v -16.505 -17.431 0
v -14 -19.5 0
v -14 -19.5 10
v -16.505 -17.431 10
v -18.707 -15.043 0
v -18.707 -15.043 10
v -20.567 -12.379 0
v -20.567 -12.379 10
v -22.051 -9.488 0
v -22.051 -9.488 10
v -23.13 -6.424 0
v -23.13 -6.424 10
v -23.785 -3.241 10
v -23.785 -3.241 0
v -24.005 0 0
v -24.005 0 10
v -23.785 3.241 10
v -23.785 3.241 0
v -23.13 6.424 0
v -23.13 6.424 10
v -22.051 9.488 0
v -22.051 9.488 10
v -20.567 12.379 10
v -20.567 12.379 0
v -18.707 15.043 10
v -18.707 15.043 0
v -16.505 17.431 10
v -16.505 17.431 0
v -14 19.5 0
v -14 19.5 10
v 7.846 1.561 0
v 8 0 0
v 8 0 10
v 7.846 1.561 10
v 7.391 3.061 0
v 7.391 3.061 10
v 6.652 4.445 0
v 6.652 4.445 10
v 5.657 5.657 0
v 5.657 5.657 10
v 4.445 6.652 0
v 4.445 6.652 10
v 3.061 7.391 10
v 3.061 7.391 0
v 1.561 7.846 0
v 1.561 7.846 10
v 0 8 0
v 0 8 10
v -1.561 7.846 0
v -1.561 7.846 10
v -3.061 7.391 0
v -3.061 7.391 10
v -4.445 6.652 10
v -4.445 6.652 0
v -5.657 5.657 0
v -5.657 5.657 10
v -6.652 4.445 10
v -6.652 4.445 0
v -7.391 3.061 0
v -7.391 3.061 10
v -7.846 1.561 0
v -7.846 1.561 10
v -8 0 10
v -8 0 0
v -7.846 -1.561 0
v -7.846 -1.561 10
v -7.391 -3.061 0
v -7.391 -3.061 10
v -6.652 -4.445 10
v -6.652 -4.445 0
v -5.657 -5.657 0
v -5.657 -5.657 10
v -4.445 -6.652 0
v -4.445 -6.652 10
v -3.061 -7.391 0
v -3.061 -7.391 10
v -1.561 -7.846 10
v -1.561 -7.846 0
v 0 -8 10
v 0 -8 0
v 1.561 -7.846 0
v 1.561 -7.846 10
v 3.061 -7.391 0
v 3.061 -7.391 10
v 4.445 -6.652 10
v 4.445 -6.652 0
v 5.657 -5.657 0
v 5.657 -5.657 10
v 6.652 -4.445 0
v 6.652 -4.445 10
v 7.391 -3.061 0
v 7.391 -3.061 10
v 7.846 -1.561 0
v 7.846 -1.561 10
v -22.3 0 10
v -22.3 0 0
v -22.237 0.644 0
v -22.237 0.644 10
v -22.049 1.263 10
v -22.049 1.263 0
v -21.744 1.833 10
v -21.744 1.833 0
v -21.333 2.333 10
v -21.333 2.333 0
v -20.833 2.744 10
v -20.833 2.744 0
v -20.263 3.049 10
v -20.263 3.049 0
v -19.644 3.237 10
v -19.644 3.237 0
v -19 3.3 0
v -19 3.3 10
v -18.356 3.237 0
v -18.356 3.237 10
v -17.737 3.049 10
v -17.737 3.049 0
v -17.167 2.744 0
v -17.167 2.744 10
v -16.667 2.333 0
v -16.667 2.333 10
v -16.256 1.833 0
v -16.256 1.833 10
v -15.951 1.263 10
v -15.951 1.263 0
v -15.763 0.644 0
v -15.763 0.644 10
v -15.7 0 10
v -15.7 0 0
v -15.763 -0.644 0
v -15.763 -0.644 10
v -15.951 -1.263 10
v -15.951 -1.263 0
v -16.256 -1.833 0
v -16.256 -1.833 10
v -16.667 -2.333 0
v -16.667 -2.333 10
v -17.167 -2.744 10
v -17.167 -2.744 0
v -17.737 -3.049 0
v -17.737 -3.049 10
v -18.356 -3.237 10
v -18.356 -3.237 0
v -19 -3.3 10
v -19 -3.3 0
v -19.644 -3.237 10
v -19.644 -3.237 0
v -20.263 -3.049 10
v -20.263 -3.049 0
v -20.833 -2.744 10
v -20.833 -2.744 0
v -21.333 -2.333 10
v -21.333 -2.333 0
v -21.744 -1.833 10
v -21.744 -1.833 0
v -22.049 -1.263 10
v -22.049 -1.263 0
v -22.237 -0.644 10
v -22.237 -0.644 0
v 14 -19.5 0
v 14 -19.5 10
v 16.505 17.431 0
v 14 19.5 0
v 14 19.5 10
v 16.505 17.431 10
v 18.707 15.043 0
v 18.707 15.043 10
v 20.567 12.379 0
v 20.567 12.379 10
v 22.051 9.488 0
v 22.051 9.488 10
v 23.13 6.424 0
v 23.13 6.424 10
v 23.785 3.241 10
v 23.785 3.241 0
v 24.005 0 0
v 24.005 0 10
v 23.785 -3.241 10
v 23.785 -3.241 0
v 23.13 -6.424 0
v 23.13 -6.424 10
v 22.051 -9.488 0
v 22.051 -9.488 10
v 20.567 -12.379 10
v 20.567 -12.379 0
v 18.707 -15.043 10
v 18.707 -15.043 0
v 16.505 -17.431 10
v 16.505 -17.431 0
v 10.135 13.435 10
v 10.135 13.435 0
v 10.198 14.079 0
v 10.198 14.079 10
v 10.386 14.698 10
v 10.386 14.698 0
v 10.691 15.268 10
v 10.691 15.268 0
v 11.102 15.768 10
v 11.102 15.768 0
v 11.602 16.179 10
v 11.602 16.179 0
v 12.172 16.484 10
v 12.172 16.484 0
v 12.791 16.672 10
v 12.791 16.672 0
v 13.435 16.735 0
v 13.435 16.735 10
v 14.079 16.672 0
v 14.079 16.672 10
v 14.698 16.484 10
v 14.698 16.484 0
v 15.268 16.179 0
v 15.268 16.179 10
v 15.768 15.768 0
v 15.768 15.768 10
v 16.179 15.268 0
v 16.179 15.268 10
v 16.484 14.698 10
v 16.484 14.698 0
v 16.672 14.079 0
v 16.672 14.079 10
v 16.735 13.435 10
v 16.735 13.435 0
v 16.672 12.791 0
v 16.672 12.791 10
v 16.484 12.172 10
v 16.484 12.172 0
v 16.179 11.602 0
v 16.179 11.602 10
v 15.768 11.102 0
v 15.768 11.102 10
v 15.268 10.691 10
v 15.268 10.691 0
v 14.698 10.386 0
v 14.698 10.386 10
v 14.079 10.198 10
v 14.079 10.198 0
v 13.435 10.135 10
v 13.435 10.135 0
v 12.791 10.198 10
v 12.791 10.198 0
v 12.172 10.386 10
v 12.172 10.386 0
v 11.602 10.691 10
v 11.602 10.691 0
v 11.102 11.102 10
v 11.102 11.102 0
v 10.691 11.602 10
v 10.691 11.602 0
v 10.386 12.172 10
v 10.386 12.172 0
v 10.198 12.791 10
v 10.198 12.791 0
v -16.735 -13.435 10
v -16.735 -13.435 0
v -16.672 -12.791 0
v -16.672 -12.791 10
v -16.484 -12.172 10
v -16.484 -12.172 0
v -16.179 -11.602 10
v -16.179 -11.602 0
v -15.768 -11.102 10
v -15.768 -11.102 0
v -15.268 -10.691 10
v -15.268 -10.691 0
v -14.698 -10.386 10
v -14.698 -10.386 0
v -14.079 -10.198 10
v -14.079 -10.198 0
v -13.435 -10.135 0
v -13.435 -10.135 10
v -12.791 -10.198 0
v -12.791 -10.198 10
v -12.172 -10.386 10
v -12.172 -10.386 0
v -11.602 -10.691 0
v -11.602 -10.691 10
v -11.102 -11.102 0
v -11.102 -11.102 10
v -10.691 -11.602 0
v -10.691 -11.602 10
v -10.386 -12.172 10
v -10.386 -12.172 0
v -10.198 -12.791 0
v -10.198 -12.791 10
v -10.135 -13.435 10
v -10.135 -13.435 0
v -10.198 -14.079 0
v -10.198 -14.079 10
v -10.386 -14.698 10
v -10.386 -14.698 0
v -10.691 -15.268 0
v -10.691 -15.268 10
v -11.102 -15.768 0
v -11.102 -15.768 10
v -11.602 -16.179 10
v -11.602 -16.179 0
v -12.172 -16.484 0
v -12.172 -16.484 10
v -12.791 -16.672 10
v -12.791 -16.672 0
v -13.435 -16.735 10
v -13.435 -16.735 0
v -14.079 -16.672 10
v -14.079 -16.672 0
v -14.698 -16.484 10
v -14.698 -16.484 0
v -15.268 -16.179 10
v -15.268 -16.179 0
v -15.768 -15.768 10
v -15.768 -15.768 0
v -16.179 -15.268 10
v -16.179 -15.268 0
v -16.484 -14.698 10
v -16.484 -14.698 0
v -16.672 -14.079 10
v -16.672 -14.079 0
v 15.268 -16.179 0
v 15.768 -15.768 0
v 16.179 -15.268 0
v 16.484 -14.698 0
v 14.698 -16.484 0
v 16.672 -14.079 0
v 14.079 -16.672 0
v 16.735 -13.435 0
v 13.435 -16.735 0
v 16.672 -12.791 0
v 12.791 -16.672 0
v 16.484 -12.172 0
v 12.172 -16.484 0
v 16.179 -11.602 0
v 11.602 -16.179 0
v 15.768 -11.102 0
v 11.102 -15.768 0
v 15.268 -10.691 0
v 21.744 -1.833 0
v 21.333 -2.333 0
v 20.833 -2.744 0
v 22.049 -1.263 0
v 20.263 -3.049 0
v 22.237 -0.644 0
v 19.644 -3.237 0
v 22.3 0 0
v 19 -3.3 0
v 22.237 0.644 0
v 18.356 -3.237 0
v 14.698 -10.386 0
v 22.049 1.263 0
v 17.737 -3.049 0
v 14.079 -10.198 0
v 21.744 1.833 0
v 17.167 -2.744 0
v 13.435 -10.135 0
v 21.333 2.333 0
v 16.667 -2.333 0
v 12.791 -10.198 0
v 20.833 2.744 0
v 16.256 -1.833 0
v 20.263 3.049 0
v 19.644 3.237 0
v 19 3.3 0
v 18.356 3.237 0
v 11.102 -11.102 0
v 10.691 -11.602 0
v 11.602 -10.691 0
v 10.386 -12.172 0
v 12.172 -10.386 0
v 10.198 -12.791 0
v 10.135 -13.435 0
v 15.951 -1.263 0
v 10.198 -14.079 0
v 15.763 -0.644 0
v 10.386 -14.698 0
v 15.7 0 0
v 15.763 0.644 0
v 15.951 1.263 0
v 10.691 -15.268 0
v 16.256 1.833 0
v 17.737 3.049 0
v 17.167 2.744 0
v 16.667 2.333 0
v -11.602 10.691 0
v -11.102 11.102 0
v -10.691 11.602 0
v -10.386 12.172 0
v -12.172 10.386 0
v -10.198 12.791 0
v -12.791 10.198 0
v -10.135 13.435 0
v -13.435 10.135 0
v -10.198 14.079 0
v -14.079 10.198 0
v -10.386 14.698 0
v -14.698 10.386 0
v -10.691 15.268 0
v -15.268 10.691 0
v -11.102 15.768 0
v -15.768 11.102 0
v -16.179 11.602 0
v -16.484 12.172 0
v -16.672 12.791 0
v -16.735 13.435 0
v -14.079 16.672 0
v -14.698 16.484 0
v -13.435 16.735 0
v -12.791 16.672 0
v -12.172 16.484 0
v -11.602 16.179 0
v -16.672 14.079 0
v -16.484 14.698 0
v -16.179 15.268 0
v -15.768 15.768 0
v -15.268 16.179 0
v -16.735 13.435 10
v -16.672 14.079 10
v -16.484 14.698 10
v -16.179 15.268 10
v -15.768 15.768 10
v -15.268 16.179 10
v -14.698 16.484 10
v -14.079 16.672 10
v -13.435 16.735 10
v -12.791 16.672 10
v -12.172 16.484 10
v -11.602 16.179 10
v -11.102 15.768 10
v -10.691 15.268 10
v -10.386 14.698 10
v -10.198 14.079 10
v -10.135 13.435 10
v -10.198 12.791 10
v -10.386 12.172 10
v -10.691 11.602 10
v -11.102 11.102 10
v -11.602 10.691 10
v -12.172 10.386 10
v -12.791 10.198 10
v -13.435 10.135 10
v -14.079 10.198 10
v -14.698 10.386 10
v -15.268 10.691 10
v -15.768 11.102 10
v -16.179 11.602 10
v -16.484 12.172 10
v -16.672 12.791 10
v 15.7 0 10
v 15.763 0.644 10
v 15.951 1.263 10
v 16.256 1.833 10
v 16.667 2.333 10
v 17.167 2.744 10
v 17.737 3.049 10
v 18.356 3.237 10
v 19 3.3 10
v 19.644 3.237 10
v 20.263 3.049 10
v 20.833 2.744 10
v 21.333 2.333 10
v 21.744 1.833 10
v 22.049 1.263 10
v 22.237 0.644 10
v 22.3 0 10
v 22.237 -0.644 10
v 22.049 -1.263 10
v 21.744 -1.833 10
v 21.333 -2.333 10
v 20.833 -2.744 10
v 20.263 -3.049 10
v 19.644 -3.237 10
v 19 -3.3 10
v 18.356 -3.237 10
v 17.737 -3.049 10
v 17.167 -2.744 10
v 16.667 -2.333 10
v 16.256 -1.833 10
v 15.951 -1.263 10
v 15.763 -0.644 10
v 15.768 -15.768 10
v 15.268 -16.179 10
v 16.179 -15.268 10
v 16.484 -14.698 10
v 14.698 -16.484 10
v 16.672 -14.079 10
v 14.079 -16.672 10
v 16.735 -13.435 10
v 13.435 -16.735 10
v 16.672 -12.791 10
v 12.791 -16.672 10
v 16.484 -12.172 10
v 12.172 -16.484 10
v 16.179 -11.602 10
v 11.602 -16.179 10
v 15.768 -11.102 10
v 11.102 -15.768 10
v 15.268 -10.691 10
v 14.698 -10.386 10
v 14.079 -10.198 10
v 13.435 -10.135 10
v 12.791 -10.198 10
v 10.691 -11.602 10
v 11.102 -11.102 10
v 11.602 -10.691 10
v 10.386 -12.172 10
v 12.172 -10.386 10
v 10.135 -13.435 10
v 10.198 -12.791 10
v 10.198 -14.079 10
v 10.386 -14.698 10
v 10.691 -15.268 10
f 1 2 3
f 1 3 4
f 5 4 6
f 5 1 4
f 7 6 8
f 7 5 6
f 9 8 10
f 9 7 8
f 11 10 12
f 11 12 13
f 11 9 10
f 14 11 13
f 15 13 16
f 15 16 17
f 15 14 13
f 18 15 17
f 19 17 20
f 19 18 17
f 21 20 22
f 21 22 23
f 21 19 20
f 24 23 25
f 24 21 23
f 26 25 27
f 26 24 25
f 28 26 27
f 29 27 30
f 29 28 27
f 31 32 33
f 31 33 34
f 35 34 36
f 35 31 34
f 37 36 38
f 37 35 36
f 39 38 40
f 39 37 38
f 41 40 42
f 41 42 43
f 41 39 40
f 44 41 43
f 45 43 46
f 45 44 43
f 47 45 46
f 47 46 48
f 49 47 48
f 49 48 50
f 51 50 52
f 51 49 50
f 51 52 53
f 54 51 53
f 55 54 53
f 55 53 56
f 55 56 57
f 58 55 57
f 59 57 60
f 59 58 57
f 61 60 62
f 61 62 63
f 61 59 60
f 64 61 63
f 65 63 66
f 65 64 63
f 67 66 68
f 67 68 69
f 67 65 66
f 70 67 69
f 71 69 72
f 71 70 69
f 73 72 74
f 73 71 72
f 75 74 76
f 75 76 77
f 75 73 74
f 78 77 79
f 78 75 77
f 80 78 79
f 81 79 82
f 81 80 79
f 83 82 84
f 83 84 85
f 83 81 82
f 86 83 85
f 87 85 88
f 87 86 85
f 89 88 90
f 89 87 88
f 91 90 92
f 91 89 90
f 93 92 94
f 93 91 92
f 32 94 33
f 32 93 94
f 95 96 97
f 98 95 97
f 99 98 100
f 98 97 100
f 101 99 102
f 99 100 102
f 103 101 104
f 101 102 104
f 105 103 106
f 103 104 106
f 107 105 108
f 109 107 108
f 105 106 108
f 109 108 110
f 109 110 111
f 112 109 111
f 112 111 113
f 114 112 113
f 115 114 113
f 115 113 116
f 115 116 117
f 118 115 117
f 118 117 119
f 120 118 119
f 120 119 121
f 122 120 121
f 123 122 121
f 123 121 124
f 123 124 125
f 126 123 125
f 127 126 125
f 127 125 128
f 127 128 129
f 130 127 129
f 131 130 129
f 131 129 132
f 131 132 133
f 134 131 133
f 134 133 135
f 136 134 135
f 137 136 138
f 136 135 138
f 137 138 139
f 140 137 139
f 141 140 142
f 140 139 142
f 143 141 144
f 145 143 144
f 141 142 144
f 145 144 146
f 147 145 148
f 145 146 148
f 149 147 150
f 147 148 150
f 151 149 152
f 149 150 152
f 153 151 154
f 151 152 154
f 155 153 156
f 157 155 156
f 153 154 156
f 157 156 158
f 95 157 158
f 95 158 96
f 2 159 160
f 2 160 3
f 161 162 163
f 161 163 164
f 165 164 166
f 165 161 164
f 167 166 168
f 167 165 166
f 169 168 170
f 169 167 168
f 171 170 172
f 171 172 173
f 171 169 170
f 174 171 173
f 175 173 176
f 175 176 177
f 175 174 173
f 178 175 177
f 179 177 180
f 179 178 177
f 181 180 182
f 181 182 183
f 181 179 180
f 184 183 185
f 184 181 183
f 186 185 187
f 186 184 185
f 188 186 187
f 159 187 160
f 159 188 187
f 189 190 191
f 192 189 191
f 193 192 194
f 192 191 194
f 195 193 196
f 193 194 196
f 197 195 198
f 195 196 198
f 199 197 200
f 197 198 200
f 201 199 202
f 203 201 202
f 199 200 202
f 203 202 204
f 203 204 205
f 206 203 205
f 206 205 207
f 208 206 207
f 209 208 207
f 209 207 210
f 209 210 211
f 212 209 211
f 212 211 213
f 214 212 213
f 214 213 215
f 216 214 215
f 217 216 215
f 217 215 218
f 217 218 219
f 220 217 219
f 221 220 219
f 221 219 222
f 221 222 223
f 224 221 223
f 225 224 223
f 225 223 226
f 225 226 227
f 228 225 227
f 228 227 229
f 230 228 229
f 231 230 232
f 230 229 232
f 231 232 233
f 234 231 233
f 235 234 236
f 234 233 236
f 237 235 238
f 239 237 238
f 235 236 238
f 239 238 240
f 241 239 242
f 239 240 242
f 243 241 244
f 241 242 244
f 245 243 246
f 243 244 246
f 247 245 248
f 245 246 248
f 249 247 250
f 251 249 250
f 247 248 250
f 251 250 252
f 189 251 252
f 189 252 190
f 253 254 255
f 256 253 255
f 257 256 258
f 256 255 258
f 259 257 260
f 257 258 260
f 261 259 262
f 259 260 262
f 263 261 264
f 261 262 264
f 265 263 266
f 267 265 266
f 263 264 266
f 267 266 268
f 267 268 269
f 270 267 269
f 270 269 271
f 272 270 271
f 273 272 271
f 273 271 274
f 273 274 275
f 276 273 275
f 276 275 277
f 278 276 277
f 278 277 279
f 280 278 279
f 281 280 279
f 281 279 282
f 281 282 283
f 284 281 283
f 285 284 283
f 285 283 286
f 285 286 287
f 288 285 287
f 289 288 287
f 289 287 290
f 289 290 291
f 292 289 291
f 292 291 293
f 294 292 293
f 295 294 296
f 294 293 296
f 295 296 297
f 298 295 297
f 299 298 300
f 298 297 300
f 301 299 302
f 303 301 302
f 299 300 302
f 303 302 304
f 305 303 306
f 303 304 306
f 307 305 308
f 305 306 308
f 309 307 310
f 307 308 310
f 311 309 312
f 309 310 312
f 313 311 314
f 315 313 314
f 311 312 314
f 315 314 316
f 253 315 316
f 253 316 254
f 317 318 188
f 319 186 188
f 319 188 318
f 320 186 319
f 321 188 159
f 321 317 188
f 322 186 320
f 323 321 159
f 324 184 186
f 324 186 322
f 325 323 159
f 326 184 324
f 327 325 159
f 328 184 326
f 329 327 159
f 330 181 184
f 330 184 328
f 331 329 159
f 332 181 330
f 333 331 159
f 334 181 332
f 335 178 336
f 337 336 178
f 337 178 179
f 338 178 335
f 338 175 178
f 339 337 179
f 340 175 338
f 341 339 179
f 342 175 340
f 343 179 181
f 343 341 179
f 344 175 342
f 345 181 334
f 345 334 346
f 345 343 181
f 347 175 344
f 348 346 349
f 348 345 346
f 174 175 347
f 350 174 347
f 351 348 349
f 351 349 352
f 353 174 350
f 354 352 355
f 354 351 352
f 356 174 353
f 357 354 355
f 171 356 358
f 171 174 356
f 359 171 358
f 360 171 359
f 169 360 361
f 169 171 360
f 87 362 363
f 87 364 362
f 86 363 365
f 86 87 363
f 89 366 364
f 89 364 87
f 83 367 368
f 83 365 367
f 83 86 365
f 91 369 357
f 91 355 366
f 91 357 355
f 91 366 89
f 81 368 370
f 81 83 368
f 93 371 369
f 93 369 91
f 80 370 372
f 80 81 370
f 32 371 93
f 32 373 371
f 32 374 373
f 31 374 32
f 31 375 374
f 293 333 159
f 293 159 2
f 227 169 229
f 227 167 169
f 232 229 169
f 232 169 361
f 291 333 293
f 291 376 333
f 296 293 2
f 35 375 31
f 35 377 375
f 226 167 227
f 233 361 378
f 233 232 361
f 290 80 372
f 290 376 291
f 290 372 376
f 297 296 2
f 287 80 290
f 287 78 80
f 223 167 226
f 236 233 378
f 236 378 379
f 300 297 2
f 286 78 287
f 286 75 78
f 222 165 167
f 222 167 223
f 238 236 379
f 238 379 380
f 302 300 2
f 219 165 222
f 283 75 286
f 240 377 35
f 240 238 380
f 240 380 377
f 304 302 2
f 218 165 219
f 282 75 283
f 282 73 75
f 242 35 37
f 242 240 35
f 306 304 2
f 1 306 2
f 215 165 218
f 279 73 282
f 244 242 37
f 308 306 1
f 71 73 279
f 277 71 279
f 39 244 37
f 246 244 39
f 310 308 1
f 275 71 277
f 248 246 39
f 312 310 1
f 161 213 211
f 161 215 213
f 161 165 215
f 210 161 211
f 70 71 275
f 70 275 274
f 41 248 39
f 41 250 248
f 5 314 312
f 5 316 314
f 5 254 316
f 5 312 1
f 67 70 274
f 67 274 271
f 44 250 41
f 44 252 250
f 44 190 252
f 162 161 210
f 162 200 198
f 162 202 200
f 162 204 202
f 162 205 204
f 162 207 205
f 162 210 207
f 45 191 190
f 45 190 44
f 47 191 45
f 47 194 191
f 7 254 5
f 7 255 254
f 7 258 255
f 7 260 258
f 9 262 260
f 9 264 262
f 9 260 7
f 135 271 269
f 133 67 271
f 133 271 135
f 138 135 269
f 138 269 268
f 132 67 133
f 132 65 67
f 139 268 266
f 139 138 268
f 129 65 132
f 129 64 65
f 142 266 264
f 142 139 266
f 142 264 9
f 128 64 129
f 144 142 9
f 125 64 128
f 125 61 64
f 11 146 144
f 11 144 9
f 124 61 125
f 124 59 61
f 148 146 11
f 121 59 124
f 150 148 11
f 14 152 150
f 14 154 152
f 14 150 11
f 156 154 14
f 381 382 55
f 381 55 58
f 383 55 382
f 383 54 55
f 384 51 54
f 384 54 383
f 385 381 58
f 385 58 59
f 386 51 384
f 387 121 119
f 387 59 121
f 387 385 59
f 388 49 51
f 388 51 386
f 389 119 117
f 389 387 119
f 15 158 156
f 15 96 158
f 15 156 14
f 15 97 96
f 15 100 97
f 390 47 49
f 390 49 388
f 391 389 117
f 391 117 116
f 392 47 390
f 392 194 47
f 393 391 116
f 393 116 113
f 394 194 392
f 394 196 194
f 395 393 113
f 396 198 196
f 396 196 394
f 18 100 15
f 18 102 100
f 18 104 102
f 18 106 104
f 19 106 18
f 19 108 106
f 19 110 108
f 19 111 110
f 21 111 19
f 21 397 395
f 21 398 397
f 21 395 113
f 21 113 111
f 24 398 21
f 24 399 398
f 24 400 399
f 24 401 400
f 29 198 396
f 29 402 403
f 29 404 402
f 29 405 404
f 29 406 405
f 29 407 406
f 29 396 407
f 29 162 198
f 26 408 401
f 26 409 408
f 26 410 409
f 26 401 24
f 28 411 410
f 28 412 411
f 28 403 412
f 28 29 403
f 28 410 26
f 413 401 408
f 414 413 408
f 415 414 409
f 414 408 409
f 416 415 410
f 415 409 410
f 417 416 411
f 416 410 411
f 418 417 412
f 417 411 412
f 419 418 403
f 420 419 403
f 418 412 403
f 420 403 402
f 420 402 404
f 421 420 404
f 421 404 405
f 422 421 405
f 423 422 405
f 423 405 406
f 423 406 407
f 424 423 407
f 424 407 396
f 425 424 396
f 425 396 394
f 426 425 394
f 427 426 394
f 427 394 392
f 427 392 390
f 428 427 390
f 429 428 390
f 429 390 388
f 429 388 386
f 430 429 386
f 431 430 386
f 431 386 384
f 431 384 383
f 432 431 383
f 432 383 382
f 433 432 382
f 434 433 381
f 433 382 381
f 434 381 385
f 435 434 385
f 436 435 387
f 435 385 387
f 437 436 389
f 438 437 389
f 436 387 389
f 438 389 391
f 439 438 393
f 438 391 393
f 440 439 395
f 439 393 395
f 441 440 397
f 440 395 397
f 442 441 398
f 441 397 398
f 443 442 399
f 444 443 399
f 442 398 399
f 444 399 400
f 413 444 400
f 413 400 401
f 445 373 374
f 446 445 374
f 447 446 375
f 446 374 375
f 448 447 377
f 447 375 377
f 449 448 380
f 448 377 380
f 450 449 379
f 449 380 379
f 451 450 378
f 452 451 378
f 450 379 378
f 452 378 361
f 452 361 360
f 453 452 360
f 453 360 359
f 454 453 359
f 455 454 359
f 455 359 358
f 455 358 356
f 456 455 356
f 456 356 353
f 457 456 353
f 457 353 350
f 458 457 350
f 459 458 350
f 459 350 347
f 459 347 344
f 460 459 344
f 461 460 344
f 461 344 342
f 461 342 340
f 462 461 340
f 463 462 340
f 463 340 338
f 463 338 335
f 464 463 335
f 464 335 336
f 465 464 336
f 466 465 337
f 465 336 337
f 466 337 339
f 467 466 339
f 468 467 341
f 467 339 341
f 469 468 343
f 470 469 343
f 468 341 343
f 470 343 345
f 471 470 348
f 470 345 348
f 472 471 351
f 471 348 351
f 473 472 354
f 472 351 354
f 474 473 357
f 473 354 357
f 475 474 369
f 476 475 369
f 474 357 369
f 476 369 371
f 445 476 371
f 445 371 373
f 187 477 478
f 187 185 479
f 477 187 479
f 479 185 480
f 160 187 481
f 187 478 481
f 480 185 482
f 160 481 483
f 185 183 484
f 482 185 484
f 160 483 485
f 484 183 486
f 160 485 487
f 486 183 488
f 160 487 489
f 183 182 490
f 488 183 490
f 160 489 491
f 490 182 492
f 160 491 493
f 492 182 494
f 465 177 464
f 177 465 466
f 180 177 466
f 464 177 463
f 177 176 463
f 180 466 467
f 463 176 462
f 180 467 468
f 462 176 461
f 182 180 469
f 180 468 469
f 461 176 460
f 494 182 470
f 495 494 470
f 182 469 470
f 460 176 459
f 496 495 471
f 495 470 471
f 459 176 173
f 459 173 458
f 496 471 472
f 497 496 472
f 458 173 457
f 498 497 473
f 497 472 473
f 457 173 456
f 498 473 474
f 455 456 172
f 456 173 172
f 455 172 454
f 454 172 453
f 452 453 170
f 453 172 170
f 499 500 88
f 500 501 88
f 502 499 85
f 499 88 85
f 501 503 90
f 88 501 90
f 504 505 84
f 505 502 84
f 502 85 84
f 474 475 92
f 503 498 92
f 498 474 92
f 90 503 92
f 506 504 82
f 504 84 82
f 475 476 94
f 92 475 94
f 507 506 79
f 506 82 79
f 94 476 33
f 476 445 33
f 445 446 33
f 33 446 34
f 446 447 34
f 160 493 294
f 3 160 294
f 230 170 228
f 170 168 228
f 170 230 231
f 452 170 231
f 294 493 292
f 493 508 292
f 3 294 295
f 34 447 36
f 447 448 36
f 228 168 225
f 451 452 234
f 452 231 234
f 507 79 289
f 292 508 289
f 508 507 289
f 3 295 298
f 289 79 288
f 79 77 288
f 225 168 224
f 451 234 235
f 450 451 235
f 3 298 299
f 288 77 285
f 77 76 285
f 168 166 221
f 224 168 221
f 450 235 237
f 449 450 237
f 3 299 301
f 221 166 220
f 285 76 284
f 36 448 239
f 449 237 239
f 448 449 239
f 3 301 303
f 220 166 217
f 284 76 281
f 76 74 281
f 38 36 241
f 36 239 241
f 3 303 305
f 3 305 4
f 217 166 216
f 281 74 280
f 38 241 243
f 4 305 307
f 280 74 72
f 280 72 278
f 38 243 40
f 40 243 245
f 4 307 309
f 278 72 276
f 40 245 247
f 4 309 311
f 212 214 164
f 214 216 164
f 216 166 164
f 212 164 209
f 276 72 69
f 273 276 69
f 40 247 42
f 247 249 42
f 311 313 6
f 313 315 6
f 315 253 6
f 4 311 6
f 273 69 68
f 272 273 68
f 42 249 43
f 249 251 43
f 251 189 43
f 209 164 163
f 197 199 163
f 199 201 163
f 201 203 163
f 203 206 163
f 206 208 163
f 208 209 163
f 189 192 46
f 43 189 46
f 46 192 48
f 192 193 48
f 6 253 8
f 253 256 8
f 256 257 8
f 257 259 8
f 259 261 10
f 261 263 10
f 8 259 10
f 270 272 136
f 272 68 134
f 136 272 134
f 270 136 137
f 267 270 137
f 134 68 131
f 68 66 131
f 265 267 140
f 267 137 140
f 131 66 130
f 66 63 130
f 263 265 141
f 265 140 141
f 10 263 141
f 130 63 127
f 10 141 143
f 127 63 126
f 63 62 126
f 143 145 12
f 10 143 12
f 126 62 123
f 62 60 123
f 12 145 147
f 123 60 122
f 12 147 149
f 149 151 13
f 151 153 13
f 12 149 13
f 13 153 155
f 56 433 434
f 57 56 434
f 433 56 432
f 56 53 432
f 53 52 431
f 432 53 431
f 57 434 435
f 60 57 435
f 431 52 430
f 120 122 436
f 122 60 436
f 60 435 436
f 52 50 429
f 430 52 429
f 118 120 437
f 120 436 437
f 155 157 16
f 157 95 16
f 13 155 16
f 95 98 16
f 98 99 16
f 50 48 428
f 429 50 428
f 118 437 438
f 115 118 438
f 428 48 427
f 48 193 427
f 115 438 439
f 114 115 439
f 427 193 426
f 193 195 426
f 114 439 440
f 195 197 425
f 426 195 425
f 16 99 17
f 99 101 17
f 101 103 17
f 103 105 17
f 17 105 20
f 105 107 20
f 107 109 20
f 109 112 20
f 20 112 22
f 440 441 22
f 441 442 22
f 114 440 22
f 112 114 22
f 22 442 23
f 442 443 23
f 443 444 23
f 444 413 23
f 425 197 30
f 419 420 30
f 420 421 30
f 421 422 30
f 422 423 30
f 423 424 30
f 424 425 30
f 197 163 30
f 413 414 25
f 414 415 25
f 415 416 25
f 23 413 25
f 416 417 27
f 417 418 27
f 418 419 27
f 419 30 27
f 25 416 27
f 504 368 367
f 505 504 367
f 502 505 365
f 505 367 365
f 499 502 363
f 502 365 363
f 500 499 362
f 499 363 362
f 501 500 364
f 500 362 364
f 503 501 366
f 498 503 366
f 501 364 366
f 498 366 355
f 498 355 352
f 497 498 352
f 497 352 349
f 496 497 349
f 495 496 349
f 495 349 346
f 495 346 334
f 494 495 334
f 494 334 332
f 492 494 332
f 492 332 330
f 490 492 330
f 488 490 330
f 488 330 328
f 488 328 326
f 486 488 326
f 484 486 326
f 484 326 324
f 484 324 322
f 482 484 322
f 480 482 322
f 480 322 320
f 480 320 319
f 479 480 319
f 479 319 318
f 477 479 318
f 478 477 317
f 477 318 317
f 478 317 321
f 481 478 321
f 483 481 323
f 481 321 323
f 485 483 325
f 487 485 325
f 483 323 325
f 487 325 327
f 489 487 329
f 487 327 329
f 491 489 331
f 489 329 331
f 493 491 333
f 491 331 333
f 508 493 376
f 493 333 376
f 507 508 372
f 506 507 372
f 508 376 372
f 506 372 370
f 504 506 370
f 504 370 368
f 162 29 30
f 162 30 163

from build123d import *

# Parameters (mm, degrees)
SKETCH1_R            = 8
BOSS_EXTRUDE1_DEPTH  = 10
M6_CLEARANCE_HOLE1_D = 6.6


with BuildPart() as part:
    # Sketch1 → Boss-Extrude1 (new body)
    with BuildSketch(Plane.XY):
        with BuildLine():
            Line((-14, 19.5), (14, 19.5))
            ThreePointArc((14, 19.5), (24.005207768, 0), (14, -19.5))
            Line((14, -19.5), (-14, -19.5))
            ThreePointArc((-14, -19.5), (-24.005207768, 0), (-14, 19.5))
        make_face()
        Circle(SKETCH1_R, mode=Mode.SUBTRACT)
    extrude(amount=BOSS_EXTRUDE1_DEPTH)

    # M6 Clearance Hole1 (through all)
    with Locations(Plane.XY.offset(10)):
        with Locations((-13.435028843, 13.435028843), (13.435028843, 13.435028843), (19, 0), (13.435028843, -13.435028843), (-13.435028843, -13.435028843), (-19, 0)):
            Hole(M6_CLEARANCE_HOLE1_D / 2)


solid = part.part
